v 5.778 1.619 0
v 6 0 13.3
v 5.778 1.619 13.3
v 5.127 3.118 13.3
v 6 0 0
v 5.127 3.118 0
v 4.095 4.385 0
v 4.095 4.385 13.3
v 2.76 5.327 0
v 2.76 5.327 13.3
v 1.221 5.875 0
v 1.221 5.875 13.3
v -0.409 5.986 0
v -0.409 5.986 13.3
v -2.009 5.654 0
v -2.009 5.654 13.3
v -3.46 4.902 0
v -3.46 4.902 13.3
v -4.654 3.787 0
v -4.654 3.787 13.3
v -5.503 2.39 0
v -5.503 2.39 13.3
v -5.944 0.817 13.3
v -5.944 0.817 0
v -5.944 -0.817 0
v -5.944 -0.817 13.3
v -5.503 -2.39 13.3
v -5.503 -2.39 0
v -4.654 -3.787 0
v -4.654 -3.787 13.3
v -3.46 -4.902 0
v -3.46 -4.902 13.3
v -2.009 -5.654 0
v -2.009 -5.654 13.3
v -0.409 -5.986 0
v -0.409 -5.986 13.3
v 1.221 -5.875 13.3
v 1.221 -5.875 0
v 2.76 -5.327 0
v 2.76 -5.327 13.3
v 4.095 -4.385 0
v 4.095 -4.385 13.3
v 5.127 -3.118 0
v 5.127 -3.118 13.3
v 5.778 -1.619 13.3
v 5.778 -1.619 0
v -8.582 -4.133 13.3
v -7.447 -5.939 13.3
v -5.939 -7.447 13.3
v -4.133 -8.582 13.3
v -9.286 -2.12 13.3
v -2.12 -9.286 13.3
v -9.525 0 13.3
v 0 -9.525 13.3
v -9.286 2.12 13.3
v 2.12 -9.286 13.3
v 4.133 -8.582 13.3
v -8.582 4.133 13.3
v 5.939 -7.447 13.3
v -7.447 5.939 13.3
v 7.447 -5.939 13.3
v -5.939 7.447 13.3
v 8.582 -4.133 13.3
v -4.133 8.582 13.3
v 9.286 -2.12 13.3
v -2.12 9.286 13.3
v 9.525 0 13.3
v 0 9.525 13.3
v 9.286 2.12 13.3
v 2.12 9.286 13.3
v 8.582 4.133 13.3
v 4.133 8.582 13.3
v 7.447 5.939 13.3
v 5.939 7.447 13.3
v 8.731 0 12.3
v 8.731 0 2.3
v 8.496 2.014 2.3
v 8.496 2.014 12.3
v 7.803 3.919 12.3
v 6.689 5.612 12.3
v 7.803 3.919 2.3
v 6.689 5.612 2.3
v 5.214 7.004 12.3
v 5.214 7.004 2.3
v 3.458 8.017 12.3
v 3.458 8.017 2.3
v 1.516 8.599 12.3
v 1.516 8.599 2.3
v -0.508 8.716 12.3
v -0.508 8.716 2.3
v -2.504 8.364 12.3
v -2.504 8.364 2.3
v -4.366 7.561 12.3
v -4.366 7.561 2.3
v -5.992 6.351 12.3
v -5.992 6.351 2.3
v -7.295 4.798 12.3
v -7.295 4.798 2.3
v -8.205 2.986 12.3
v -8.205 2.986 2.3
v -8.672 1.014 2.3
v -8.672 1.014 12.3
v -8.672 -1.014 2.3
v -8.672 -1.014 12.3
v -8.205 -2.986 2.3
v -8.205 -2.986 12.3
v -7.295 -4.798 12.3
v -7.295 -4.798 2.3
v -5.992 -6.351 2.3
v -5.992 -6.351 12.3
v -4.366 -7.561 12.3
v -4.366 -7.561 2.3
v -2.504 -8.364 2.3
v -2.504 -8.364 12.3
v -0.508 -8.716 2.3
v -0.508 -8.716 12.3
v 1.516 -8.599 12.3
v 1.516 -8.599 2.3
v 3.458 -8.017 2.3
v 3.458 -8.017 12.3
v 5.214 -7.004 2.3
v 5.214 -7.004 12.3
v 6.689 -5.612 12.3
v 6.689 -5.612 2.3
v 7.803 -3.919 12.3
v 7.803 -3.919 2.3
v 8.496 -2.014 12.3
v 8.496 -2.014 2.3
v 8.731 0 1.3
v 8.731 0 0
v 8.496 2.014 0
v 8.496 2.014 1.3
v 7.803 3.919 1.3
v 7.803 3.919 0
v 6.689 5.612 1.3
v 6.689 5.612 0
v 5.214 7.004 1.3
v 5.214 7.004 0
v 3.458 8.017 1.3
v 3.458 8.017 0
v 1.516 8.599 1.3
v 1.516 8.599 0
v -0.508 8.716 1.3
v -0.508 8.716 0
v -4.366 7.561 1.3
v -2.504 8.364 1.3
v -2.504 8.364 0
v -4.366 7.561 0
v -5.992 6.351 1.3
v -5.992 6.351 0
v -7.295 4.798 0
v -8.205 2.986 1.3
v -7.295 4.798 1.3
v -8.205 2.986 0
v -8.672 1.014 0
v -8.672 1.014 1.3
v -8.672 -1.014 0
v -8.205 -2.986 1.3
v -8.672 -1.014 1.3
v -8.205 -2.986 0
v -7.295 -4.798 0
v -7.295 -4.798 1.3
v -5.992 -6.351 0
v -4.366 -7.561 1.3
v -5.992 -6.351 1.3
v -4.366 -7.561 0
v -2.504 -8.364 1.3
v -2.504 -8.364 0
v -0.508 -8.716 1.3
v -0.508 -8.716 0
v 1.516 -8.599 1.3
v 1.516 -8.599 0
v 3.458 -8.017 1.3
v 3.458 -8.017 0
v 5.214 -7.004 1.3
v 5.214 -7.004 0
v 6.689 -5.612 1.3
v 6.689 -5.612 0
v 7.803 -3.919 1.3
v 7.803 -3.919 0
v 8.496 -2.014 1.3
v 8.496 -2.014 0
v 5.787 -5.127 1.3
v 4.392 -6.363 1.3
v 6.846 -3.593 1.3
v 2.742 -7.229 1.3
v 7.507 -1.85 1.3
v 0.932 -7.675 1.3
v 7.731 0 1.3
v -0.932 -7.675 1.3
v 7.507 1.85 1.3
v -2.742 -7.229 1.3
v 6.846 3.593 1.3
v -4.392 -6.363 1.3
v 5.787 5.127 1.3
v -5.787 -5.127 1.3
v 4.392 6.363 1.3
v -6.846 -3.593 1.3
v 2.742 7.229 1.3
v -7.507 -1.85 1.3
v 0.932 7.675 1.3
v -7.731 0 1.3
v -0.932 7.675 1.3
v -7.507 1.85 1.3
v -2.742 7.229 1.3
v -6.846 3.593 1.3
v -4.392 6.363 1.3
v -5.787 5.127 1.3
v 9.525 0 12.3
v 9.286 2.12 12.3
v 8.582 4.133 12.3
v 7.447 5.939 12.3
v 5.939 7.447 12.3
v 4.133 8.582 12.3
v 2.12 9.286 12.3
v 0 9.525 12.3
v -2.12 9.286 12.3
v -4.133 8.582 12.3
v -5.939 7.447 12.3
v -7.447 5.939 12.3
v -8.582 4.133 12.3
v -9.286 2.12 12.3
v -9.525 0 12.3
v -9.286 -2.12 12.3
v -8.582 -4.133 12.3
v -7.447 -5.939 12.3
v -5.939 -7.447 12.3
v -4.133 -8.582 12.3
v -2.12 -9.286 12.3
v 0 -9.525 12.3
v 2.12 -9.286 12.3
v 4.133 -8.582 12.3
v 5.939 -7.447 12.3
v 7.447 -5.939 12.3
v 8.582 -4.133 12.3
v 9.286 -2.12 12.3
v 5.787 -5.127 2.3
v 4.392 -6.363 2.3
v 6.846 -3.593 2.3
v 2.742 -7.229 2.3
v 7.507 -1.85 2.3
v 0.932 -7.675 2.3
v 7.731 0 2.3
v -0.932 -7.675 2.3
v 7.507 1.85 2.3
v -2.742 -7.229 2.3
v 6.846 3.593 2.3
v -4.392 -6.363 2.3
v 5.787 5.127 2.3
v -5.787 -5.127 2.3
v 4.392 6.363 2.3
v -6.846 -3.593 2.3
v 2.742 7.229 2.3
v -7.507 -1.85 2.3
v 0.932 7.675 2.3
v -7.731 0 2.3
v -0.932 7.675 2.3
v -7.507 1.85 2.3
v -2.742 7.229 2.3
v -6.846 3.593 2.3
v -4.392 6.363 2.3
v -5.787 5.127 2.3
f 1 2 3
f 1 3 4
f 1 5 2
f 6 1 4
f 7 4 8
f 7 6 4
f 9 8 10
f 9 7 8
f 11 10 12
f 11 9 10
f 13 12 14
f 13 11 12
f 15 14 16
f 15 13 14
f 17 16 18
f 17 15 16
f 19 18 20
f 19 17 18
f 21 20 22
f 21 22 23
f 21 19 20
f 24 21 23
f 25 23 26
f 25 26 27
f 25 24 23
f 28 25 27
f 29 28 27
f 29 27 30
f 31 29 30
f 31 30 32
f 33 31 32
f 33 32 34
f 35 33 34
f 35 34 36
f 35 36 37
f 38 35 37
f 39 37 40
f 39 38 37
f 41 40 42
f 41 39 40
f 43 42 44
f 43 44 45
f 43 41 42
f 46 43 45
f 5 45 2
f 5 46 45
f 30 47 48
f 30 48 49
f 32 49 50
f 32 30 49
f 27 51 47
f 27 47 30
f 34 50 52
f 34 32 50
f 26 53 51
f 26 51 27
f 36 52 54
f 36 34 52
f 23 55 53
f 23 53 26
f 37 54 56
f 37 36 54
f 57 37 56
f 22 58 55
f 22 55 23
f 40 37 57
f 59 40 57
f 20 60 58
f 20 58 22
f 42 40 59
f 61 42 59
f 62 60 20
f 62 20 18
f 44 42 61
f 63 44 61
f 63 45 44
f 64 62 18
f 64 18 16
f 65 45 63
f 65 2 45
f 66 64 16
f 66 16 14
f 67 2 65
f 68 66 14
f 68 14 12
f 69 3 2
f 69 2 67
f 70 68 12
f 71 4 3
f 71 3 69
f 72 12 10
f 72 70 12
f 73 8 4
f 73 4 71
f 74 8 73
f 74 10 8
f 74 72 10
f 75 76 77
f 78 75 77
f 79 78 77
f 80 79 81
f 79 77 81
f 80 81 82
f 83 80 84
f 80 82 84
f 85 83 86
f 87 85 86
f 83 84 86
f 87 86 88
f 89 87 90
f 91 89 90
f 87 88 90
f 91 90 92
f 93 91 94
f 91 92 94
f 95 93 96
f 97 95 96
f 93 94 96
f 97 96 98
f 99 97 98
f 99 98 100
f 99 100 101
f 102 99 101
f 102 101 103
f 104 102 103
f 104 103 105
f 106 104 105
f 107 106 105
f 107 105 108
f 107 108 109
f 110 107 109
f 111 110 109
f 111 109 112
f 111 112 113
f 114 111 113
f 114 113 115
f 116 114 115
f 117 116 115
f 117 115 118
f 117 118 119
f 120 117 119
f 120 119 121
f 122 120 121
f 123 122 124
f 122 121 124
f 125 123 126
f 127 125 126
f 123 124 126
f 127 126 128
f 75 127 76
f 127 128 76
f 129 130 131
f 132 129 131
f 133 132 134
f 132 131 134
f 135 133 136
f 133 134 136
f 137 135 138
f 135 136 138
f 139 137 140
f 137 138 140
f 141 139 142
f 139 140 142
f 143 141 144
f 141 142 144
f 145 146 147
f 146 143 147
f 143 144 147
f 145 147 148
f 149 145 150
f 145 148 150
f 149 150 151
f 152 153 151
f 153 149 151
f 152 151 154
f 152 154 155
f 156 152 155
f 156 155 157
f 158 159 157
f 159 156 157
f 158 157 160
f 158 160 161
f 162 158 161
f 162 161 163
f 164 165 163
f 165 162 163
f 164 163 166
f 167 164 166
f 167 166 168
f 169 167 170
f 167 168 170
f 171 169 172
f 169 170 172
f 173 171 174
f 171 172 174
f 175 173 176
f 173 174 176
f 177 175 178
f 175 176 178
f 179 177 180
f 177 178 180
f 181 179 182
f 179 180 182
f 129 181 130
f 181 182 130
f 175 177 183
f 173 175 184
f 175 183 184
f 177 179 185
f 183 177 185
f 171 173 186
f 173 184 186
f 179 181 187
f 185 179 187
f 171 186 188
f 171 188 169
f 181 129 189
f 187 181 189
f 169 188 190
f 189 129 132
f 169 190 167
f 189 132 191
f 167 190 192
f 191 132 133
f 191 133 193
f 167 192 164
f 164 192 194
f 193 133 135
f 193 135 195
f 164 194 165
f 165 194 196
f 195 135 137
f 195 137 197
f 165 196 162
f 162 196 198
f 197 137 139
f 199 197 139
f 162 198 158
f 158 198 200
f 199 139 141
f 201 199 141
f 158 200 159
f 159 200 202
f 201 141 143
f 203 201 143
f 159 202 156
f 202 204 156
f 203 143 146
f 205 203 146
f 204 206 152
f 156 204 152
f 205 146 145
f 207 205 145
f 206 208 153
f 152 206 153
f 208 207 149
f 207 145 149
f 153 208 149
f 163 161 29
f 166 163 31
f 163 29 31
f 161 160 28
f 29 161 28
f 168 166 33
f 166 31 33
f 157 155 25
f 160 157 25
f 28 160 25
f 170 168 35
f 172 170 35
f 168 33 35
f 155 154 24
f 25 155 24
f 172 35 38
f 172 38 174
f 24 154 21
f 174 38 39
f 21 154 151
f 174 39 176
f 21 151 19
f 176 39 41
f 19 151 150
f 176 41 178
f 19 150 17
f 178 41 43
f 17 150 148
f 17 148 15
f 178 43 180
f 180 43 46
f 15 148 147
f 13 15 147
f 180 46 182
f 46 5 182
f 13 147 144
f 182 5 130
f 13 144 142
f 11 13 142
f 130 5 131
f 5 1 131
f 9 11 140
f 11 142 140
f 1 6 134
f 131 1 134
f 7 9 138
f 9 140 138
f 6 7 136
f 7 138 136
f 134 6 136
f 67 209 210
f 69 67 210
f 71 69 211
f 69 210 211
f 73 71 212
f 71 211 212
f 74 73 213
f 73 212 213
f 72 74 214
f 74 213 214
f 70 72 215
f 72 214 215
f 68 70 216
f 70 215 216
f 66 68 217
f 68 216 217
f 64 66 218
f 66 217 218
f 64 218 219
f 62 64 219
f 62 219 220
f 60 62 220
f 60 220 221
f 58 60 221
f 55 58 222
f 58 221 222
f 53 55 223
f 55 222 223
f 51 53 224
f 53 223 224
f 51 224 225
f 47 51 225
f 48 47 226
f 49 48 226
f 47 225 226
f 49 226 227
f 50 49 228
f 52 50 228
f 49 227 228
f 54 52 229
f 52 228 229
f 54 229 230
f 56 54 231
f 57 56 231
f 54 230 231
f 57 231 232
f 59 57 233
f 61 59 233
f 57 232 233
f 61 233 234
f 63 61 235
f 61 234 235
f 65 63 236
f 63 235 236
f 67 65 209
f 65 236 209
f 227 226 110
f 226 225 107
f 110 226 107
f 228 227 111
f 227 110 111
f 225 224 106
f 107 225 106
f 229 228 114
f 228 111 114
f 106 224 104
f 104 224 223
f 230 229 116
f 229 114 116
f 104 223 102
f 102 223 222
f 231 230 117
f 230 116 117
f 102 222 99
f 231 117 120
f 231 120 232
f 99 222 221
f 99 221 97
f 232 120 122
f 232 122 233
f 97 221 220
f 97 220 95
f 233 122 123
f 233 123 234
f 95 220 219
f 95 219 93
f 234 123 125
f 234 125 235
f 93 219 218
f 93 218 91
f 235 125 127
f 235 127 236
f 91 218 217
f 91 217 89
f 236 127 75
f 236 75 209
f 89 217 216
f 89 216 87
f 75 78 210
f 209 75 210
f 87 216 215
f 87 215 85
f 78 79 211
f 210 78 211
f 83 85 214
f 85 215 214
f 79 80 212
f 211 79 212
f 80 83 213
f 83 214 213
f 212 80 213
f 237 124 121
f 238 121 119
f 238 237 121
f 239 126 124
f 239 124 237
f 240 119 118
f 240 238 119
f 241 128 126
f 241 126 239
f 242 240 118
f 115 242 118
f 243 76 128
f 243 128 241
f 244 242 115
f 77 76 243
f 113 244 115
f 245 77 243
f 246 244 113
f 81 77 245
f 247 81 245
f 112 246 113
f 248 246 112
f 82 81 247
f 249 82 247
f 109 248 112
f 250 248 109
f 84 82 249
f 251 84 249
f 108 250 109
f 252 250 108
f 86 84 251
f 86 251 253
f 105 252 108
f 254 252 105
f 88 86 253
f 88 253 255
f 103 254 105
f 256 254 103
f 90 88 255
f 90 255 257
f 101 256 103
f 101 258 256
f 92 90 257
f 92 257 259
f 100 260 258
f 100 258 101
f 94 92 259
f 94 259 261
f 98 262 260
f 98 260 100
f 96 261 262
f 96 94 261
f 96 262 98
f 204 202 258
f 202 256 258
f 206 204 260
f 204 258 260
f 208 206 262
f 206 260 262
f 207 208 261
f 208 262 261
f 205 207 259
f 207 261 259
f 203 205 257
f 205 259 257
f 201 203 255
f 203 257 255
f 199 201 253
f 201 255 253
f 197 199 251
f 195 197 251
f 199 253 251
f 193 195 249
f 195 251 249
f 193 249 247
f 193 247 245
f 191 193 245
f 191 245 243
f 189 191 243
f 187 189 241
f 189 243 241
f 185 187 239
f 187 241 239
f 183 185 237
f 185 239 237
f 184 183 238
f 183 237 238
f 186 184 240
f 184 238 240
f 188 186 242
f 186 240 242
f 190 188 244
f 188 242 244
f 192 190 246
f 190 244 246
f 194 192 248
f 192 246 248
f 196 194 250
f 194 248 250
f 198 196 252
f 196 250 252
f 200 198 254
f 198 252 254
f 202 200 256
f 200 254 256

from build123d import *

# Parameters (mm, degrees)
F0_R     = 8.73125
F0_R_2   = 6
F1_DEPTH = 12.3
F2_R     = 9.525
F2_R_2   = 6
F3_DEPTH = 1
F4_W     = 2
F4_H     = 1


with BuildPart() as f1:
    # F0 (on Top) → F1 (new body)
    with BuildSketch(Plane.XY):
        Circle(F0_R)
        Circle(F0_R_2, mode=Mode.SUBTRACT)
    extrude(amount=F1_DEPTH)

    # F2 (on face) → F3 (join)
    with BuildSketch(Plane.XY.offset(12.3)):
        Circle(F2_R)
        Circle(F2_R_2, mode=Mode.SUBTRACT)
    extrude(amount=F3_DEPTH)

    # F4 (on Front) → F5 (revolve, cut)
    with BuildSketch(Plane.XZ):
        with Locations((-8.73125, 1.8)):
            Rectangle(F4_W, F4_H)
    revolve(axis=Axis((0, 0, 7.145868), (0, 0, -1)), mode=Mode.SUBTRACT)


solid = f1.part
